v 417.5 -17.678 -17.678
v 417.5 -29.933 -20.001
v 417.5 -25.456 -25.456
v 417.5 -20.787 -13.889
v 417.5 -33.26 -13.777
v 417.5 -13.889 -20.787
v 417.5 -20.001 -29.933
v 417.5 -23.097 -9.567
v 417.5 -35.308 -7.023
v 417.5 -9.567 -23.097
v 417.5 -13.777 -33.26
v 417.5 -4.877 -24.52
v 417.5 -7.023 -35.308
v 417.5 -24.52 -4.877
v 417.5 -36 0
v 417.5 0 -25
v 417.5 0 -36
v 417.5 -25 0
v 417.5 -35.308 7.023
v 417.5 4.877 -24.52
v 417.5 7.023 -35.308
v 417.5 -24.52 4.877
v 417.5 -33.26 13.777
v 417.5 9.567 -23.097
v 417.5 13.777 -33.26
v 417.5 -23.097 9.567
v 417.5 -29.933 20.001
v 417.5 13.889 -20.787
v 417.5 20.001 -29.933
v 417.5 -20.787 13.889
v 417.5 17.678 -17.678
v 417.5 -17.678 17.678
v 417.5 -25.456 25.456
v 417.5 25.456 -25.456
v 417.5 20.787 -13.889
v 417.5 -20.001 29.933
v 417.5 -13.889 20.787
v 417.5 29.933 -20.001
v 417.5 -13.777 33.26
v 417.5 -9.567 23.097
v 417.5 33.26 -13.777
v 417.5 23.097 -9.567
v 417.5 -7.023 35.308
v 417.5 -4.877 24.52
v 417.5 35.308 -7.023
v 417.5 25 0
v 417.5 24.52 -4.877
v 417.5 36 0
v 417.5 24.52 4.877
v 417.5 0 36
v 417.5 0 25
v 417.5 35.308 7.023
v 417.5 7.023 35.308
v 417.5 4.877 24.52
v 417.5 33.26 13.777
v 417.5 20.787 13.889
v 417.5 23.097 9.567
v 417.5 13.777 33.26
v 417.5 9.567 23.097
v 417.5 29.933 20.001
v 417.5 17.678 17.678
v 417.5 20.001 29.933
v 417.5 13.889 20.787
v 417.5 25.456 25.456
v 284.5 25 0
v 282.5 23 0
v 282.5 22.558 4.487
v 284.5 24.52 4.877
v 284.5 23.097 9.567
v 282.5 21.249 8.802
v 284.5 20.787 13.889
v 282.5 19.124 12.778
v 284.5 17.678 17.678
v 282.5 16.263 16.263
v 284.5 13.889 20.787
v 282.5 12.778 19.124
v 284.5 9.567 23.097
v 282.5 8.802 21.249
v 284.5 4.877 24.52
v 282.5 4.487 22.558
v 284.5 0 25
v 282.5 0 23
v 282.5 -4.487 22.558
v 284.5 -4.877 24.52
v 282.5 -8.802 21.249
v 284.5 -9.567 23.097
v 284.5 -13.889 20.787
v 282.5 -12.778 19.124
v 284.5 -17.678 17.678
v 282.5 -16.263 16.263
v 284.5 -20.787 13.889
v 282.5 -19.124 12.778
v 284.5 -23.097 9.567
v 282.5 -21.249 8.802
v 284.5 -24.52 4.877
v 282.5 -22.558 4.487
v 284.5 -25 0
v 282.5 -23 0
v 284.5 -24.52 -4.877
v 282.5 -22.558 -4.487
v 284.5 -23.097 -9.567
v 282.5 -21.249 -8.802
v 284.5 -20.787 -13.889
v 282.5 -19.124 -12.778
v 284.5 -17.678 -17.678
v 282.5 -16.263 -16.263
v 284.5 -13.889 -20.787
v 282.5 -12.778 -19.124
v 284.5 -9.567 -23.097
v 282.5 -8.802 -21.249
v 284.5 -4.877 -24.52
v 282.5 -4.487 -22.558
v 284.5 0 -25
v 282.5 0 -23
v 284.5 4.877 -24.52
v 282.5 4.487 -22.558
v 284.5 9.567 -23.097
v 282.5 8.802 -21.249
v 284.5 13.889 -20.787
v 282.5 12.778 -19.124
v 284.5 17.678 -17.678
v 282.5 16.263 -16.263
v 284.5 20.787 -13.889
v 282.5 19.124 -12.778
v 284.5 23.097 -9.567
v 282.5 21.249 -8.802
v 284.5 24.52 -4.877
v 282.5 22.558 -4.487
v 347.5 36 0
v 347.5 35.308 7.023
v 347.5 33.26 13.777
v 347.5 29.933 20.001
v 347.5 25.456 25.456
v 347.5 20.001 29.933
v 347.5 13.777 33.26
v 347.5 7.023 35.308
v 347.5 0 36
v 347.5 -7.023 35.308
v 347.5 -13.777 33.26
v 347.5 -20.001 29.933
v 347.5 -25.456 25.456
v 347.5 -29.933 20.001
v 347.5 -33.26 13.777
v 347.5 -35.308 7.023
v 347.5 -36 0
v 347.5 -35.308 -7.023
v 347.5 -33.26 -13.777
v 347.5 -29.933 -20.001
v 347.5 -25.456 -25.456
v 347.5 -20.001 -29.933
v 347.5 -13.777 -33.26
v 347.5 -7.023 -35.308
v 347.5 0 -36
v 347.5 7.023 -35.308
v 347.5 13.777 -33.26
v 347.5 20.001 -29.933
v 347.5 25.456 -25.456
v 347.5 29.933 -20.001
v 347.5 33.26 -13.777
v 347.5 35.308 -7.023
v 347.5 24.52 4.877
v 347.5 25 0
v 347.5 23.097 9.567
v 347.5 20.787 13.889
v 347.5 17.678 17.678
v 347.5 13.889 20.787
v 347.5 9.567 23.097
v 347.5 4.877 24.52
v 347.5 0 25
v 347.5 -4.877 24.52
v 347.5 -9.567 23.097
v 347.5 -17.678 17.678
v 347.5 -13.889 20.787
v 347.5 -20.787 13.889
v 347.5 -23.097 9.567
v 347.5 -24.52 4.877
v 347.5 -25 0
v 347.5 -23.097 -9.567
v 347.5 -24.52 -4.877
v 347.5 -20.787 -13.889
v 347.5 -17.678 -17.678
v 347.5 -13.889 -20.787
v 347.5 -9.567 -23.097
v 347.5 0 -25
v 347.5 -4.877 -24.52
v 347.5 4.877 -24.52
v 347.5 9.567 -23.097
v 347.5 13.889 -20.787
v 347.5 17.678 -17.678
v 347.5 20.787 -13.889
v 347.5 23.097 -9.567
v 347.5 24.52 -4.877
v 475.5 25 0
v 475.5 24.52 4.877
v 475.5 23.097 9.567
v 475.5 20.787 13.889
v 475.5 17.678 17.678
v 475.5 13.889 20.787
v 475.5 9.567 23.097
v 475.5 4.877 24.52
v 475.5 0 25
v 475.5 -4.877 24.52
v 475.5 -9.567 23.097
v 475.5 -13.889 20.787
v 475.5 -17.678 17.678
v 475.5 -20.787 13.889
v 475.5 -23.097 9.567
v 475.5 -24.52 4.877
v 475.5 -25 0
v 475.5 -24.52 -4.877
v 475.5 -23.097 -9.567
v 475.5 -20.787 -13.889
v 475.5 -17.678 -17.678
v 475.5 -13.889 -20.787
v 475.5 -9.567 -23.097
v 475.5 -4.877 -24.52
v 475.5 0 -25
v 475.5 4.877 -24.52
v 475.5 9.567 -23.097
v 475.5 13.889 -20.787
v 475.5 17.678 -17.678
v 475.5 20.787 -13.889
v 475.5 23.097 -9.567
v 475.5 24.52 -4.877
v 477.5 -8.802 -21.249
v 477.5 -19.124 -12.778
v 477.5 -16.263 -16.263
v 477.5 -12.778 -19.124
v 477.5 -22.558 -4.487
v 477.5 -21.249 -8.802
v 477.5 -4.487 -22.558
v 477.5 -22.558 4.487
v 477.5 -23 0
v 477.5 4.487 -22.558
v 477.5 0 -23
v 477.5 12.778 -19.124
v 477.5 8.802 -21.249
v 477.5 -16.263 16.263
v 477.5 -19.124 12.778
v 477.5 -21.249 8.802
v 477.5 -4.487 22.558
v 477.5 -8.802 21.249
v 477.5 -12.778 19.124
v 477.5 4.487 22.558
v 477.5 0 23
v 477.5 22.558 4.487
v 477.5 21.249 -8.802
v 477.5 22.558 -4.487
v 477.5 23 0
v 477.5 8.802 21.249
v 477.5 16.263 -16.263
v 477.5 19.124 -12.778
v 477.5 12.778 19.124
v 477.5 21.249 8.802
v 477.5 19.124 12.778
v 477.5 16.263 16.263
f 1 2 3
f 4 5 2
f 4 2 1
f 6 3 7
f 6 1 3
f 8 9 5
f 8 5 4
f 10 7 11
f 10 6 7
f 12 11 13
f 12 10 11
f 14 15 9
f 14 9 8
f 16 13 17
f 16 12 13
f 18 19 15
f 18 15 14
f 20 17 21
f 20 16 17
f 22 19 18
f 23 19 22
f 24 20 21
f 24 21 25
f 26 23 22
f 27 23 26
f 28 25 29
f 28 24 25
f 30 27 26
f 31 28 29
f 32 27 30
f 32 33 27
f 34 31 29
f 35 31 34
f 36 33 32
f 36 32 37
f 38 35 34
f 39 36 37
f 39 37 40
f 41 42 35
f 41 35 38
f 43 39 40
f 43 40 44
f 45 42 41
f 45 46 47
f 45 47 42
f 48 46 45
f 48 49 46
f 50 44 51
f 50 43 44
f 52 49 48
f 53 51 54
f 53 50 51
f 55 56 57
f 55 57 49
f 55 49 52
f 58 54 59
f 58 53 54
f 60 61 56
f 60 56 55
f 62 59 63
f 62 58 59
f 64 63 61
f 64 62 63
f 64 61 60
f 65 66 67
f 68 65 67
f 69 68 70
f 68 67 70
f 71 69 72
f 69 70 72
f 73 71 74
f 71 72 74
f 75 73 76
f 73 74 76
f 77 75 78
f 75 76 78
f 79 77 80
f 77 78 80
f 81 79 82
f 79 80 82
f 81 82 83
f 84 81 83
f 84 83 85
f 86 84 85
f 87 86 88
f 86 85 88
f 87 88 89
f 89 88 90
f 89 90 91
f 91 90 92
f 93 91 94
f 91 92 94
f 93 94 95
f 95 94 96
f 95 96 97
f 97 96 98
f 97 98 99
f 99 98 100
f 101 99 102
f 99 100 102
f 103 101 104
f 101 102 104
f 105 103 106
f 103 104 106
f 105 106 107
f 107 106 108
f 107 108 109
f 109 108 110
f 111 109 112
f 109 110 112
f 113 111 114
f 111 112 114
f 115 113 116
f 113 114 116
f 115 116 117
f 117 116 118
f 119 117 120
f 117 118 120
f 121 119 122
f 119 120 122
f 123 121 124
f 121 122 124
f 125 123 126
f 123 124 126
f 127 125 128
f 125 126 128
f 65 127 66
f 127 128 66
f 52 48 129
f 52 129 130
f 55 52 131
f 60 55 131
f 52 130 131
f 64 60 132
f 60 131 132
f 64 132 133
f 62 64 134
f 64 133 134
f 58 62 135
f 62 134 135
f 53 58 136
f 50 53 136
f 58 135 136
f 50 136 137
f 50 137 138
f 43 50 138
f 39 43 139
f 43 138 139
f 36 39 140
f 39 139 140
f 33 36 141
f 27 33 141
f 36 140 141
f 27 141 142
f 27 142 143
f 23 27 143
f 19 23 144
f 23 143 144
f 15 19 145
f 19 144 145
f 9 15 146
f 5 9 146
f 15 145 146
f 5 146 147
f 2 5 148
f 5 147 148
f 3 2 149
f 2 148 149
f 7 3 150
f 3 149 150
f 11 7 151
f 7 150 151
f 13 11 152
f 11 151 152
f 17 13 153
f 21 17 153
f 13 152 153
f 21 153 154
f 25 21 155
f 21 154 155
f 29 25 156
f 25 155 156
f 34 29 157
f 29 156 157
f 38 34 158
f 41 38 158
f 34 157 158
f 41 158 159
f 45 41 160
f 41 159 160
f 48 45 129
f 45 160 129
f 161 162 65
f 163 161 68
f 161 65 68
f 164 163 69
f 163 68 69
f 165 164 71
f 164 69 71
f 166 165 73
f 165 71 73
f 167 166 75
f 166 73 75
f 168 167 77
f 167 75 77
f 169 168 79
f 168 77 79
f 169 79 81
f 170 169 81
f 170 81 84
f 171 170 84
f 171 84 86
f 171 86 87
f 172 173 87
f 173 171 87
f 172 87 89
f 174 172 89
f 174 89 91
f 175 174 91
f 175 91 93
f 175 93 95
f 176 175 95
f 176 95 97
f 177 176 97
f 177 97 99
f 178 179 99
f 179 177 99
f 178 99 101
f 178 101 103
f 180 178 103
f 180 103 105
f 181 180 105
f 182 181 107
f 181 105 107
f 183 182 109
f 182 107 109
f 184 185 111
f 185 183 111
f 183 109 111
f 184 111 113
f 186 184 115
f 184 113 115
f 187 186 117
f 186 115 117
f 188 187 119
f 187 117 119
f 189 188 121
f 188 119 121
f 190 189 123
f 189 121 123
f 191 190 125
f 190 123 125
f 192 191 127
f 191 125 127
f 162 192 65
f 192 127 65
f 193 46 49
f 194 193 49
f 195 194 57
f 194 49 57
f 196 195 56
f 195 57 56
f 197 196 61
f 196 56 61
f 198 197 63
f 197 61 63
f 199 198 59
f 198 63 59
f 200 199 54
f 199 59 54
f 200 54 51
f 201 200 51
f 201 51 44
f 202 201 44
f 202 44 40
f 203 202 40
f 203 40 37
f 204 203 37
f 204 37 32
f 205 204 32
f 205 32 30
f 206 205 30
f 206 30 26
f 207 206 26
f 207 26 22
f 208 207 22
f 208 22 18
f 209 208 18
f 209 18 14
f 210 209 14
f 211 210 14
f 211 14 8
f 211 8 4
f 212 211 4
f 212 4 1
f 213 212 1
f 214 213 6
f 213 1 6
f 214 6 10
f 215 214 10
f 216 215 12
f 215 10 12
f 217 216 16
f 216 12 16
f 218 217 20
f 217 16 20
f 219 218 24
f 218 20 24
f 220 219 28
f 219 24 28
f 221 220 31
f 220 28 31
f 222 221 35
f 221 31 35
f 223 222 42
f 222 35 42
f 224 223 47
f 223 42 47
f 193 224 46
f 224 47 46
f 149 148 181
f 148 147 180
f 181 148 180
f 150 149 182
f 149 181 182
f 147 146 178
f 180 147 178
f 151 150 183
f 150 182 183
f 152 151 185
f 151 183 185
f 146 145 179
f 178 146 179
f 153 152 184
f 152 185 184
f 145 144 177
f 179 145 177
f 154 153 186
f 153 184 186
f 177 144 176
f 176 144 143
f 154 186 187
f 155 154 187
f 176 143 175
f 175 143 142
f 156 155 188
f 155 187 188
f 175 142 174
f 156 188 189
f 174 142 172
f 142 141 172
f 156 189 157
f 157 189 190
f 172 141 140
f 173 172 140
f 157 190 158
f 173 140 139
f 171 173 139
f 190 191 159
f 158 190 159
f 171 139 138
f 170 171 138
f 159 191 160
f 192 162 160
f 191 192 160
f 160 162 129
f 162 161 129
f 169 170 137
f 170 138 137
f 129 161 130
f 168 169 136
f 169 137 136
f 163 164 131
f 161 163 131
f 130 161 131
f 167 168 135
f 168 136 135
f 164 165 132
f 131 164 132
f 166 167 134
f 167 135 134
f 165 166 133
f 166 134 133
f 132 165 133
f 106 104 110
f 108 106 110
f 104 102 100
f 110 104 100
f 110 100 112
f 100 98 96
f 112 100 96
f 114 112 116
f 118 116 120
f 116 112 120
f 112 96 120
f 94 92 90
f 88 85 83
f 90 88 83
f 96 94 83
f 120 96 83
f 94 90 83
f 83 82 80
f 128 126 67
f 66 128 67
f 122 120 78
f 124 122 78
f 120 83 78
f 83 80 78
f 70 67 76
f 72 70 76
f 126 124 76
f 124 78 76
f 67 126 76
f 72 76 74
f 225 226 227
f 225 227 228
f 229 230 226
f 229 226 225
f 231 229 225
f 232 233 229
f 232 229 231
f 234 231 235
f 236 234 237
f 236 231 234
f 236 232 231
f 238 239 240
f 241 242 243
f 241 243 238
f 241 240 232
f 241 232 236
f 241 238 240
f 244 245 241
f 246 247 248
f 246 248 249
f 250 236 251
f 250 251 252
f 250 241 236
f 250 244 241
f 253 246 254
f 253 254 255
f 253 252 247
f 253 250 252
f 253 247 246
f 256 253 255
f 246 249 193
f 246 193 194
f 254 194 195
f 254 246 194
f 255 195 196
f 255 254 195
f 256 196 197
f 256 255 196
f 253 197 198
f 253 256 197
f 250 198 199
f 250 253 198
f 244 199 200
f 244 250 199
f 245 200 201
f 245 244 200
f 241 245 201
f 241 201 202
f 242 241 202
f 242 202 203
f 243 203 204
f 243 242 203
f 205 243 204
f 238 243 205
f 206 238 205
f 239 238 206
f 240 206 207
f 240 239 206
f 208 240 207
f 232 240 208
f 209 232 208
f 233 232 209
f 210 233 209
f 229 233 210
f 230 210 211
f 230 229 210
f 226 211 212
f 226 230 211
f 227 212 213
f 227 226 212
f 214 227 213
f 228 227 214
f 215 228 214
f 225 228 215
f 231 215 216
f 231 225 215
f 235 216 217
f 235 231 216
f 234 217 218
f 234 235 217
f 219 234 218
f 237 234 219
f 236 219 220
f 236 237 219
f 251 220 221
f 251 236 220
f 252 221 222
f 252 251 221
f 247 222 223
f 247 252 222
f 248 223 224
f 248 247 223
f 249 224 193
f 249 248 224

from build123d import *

# Parameters (mm, degrees)
F1_START = 347.5
F0_R     = 36
F1_DEPTH = 70
F3_START = 282.5
F2_R     = 25
F3_DEPTH = 195
F4_SIZE2 = 2
F4_SIZE  = 2


with BuildPart() as f1:
    # F0 (on Right) → F1 (new body)
    with BuildSketch(Plane.YZ.offset(F1_START)):
        Circle(F0_R)
    extrude(amount=F1_DEPTH)

    # F2 (on Right) → F3 (join)
    with BuildSketch(Plane.YZ.offset(F3_START)):
        Circle(F2_R)
    extrude(amount=F3_DEPTH)

    # F4
    f4_edges = [f1.edges().sort_by_distance(p)[0] for p in [
        (477.5, -25, 0),
        (282.5, -25, 0),
    ]]
    chamfer(f4_edges, length=F4_SIZE, length2=F4_SIZE2)


solid = f1.part
